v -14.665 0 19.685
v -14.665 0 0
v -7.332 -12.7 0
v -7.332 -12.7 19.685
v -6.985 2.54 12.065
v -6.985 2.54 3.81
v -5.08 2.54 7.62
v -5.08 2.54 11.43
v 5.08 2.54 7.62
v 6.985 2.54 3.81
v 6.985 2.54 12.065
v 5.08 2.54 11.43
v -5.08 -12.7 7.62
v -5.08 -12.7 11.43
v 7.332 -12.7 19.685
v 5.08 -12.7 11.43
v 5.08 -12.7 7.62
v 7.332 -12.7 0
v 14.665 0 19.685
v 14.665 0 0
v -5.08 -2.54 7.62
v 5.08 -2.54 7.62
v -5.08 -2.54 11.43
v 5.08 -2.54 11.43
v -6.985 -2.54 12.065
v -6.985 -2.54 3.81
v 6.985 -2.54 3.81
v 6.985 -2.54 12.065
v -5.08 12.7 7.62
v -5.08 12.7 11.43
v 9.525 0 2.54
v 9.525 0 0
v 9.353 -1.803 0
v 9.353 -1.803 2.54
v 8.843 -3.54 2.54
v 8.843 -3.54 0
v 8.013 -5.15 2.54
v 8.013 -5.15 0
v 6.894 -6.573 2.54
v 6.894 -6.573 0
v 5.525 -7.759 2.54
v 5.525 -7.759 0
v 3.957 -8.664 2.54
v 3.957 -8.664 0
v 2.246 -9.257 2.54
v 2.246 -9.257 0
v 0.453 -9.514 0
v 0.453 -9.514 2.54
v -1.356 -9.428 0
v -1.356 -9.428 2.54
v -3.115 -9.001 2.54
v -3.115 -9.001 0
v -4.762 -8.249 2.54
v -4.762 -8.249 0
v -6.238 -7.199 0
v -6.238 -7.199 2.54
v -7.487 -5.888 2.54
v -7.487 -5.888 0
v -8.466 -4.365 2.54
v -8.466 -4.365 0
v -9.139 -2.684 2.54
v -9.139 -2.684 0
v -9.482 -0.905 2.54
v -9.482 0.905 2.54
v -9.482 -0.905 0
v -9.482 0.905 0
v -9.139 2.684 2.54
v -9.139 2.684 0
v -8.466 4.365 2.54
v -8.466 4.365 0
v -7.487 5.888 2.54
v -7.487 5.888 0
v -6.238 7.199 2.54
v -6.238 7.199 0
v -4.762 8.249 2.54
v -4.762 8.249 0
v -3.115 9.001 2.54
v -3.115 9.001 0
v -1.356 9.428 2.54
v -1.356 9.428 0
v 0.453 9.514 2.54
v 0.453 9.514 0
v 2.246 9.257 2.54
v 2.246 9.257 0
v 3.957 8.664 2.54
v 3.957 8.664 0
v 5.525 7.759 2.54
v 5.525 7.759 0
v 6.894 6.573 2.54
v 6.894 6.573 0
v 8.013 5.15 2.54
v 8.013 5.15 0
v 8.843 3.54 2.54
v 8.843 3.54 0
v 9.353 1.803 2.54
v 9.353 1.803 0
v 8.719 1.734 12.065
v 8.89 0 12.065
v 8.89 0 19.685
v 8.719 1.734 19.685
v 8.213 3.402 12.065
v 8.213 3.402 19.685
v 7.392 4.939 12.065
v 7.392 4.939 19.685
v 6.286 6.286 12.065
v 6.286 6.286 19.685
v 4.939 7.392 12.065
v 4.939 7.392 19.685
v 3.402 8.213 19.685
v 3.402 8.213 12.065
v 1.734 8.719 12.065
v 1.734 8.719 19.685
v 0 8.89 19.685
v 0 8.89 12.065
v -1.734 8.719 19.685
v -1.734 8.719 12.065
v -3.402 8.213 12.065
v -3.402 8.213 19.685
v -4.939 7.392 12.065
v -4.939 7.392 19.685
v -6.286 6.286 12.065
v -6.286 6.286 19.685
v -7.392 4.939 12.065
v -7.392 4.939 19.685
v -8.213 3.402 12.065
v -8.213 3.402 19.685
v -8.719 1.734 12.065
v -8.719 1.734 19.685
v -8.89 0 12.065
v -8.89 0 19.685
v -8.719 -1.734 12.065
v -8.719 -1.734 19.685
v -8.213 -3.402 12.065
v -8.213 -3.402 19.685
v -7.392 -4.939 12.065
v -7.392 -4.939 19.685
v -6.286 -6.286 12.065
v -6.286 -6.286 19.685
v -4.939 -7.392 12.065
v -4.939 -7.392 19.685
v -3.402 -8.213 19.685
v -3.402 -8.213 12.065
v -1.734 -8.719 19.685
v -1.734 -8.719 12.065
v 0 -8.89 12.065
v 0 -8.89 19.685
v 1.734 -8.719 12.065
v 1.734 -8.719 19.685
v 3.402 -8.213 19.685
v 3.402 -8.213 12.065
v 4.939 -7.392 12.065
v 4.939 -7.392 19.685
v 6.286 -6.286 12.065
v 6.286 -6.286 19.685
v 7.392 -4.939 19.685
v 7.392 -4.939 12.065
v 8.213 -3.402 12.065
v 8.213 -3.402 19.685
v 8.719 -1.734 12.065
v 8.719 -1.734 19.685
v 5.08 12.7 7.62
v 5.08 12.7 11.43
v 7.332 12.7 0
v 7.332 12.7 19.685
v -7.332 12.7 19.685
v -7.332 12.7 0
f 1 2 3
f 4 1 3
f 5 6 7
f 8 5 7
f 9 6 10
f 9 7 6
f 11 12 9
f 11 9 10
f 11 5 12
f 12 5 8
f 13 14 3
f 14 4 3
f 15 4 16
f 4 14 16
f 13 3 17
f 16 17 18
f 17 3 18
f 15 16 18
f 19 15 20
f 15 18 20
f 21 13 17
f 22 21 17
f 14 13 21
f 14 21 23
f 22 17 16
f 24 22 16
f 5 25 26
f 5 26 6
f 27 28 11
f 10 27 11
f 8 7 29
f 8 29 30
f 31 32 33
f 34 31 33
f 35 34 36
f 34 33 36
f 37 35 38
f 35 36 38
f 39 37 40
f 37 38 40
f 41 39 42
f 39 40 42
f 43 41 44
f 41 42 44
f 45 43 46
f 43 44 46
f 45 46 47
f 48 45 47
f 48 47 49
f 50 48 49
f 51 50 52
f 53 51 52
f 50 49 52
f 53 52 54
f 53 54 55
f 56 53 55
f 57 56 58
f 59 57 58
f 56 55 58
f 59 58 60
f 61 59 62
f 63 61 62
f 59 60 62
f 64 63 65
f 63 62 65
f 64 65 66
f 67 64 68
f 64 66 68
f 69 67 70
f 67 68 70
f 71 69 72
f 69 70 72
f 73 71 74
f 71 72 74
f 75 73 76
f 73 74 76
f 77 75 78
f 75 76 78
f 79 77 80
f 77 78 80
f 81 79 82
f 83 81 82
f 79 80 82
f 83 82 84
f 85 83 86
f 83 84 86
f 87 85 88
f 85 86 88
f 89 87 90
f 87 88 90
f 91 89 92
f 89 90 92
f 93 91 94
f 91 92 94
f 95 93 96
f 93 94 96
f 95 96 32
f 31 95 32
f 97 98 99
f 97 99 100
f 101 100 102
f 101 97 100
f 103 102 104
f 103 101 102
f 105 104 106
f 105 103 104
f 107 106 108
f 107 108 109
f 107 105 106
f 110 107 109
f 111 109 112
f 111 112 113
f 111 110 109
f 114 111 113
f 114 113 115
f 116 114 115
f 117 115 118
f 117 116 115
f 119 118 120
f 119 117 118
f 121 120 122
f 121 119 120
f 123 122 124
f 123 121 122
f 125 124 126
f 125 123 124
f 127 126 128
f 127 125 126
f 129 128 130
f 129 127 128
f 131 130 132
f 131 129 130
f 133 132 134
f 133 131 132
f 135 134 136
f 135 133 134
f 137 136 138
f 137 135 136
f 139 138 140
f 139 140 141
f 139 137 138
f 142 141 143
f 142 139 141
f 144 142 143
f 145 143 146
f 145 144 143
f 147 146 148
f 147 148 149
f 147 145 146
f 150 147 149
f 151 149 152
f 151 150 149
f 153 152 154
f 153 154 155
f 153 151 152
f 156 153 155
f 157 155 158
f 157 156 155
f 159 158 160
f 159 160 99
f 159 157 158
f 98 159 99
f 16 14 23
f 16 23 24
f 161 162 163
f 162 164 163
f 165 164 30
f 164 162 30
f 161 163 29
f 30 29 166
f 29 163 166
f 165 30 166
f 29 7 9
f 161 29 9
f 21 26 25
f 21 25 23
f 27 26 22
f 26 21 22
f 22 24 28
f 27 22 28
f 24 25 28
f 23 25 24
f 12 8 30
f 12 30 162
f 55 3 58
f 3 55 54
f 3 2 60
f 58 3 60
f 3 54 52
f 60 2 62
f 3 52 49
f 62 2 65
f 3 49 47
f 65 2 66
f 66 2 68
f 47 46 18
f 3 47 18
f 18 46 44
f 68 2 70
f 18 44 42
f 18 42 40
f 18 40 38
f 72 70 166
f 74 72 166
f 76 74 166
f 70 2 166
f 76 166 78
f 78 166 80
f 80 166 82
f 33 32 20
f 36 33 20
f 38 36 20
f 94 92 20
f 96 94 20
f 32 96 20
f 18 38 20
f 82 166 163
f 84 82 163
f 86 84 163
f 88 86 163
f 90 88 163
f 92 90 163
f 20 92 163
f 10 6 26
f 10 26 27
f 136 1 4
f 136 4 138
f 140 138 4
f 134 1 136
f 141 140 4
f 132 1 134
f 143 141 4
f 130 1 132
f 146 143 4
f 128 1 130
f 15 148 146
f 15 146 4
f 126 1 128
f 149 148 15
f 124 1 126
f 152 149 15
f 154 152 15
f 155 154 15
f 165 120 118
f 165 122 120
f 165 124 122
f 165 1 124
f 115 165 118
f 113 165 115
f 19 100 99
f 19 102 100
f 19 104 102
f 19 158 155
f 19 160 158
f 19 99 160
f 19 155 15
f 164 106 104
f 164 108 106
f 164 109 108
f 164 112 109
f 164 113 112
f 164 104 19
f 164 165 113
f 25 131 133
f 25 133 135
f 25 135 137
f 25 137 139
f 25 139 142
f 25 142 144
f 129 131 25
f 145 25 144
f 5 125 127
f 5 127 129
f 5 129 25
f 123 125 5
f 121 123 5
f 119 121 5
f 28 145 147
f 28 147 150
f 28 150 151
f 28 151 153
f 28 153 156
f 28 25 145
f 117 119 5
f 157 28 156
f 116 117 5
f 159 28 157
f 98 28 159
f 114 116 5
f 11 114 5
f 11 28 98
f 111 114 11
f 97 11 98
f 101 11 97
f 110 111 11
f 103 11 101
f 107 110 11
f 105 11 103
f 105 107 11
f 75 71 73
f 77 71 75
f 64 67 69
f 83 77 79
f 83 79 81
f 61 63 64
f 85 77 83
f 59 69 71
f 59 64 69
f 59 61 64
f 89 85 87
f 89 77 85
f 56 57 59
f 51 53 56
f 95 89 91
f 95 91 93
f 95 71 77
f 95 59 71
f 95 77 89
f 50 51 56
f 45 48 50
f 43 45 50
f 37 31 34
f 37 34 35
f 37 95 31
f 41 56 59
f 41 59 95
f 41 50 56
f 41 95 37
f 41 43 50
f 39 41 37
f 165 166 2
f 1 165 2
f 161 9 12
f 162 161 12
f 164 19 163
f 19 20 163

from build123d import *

# Parameters (mm, degrees)
F1_DEPTH = 12.065
F2_W     = 10.16
F2_H     = 3.81
F3_DEPTH = 25.4010101543
F5_W     = 13.97
F5_H     = 5.08
F6_DEPTH = 8.255
F4_R     = 8.89
F7_DEPTH = 7.62
F8_R     = 9.525
F9_DEPTH = 2.54


# Not quite as in the source:
# - a feature names something its author has since deleted; it is built from what else it names


with BuildPart() as f1:
    # F0 (on Top) → F1 (new body)
    with BuildSketch(Plane.XY):
        Polygon((7.33235135, -12.7000050771), (14.6647027, 0), (7.33235135, 12.7000050771), (-7.33235135, 12.7000050771), (-14.6647027, 0), (-7.33235135, -12.7000050771), align=None)
    extrude(amount=F1_DEPTH)

    # F2 (on face) → F3 (cut, through all)
    with BuildSketch(Plane.XZ.offset(12.7000050771)):
        with Locations((0, 9.525)):
            Rectangle(F2_W, F2_H)
    extrude(amount=-F3_DEPTH, mode=Mode.SUBTRACT)

    # F5 (on face) → F6 (cut)
    with BuildSketch(Plane.XY.offset(12.065)):
        Rectangle(F5_W, F5_H)
    extrude(amount=-F6_DEPTH, mode=Mode.SUBTRACT)

    # F4 (on face) → F7 (join)
    with BuildSketch(Plane.XY.offset(12.065)):
        Polygon((-7.33235135, -12.7000050771), (7.33235135, -12.7000050771), (14.6647027, 0), (7.33235135, 12.7000050771), (-7.33235135, 12.7000050771), (-14.6647027, 0), align=None)
        Circle(F4_R, mode=Mode.SUBTRACT)
    extrude(amount=F7_DEPTH)

    # F8 (on face) → F9 (cut)
    with BuildSketch(Plane(origin=(0, 0, 0), x_dir=(1, 0, 0), z_dir=(0, 0, -1))):
        Circle(F8_R)
    extrude(amount=-F9_DEPTH, mode=Mode.SUBTRACT)


solid = f1.part
